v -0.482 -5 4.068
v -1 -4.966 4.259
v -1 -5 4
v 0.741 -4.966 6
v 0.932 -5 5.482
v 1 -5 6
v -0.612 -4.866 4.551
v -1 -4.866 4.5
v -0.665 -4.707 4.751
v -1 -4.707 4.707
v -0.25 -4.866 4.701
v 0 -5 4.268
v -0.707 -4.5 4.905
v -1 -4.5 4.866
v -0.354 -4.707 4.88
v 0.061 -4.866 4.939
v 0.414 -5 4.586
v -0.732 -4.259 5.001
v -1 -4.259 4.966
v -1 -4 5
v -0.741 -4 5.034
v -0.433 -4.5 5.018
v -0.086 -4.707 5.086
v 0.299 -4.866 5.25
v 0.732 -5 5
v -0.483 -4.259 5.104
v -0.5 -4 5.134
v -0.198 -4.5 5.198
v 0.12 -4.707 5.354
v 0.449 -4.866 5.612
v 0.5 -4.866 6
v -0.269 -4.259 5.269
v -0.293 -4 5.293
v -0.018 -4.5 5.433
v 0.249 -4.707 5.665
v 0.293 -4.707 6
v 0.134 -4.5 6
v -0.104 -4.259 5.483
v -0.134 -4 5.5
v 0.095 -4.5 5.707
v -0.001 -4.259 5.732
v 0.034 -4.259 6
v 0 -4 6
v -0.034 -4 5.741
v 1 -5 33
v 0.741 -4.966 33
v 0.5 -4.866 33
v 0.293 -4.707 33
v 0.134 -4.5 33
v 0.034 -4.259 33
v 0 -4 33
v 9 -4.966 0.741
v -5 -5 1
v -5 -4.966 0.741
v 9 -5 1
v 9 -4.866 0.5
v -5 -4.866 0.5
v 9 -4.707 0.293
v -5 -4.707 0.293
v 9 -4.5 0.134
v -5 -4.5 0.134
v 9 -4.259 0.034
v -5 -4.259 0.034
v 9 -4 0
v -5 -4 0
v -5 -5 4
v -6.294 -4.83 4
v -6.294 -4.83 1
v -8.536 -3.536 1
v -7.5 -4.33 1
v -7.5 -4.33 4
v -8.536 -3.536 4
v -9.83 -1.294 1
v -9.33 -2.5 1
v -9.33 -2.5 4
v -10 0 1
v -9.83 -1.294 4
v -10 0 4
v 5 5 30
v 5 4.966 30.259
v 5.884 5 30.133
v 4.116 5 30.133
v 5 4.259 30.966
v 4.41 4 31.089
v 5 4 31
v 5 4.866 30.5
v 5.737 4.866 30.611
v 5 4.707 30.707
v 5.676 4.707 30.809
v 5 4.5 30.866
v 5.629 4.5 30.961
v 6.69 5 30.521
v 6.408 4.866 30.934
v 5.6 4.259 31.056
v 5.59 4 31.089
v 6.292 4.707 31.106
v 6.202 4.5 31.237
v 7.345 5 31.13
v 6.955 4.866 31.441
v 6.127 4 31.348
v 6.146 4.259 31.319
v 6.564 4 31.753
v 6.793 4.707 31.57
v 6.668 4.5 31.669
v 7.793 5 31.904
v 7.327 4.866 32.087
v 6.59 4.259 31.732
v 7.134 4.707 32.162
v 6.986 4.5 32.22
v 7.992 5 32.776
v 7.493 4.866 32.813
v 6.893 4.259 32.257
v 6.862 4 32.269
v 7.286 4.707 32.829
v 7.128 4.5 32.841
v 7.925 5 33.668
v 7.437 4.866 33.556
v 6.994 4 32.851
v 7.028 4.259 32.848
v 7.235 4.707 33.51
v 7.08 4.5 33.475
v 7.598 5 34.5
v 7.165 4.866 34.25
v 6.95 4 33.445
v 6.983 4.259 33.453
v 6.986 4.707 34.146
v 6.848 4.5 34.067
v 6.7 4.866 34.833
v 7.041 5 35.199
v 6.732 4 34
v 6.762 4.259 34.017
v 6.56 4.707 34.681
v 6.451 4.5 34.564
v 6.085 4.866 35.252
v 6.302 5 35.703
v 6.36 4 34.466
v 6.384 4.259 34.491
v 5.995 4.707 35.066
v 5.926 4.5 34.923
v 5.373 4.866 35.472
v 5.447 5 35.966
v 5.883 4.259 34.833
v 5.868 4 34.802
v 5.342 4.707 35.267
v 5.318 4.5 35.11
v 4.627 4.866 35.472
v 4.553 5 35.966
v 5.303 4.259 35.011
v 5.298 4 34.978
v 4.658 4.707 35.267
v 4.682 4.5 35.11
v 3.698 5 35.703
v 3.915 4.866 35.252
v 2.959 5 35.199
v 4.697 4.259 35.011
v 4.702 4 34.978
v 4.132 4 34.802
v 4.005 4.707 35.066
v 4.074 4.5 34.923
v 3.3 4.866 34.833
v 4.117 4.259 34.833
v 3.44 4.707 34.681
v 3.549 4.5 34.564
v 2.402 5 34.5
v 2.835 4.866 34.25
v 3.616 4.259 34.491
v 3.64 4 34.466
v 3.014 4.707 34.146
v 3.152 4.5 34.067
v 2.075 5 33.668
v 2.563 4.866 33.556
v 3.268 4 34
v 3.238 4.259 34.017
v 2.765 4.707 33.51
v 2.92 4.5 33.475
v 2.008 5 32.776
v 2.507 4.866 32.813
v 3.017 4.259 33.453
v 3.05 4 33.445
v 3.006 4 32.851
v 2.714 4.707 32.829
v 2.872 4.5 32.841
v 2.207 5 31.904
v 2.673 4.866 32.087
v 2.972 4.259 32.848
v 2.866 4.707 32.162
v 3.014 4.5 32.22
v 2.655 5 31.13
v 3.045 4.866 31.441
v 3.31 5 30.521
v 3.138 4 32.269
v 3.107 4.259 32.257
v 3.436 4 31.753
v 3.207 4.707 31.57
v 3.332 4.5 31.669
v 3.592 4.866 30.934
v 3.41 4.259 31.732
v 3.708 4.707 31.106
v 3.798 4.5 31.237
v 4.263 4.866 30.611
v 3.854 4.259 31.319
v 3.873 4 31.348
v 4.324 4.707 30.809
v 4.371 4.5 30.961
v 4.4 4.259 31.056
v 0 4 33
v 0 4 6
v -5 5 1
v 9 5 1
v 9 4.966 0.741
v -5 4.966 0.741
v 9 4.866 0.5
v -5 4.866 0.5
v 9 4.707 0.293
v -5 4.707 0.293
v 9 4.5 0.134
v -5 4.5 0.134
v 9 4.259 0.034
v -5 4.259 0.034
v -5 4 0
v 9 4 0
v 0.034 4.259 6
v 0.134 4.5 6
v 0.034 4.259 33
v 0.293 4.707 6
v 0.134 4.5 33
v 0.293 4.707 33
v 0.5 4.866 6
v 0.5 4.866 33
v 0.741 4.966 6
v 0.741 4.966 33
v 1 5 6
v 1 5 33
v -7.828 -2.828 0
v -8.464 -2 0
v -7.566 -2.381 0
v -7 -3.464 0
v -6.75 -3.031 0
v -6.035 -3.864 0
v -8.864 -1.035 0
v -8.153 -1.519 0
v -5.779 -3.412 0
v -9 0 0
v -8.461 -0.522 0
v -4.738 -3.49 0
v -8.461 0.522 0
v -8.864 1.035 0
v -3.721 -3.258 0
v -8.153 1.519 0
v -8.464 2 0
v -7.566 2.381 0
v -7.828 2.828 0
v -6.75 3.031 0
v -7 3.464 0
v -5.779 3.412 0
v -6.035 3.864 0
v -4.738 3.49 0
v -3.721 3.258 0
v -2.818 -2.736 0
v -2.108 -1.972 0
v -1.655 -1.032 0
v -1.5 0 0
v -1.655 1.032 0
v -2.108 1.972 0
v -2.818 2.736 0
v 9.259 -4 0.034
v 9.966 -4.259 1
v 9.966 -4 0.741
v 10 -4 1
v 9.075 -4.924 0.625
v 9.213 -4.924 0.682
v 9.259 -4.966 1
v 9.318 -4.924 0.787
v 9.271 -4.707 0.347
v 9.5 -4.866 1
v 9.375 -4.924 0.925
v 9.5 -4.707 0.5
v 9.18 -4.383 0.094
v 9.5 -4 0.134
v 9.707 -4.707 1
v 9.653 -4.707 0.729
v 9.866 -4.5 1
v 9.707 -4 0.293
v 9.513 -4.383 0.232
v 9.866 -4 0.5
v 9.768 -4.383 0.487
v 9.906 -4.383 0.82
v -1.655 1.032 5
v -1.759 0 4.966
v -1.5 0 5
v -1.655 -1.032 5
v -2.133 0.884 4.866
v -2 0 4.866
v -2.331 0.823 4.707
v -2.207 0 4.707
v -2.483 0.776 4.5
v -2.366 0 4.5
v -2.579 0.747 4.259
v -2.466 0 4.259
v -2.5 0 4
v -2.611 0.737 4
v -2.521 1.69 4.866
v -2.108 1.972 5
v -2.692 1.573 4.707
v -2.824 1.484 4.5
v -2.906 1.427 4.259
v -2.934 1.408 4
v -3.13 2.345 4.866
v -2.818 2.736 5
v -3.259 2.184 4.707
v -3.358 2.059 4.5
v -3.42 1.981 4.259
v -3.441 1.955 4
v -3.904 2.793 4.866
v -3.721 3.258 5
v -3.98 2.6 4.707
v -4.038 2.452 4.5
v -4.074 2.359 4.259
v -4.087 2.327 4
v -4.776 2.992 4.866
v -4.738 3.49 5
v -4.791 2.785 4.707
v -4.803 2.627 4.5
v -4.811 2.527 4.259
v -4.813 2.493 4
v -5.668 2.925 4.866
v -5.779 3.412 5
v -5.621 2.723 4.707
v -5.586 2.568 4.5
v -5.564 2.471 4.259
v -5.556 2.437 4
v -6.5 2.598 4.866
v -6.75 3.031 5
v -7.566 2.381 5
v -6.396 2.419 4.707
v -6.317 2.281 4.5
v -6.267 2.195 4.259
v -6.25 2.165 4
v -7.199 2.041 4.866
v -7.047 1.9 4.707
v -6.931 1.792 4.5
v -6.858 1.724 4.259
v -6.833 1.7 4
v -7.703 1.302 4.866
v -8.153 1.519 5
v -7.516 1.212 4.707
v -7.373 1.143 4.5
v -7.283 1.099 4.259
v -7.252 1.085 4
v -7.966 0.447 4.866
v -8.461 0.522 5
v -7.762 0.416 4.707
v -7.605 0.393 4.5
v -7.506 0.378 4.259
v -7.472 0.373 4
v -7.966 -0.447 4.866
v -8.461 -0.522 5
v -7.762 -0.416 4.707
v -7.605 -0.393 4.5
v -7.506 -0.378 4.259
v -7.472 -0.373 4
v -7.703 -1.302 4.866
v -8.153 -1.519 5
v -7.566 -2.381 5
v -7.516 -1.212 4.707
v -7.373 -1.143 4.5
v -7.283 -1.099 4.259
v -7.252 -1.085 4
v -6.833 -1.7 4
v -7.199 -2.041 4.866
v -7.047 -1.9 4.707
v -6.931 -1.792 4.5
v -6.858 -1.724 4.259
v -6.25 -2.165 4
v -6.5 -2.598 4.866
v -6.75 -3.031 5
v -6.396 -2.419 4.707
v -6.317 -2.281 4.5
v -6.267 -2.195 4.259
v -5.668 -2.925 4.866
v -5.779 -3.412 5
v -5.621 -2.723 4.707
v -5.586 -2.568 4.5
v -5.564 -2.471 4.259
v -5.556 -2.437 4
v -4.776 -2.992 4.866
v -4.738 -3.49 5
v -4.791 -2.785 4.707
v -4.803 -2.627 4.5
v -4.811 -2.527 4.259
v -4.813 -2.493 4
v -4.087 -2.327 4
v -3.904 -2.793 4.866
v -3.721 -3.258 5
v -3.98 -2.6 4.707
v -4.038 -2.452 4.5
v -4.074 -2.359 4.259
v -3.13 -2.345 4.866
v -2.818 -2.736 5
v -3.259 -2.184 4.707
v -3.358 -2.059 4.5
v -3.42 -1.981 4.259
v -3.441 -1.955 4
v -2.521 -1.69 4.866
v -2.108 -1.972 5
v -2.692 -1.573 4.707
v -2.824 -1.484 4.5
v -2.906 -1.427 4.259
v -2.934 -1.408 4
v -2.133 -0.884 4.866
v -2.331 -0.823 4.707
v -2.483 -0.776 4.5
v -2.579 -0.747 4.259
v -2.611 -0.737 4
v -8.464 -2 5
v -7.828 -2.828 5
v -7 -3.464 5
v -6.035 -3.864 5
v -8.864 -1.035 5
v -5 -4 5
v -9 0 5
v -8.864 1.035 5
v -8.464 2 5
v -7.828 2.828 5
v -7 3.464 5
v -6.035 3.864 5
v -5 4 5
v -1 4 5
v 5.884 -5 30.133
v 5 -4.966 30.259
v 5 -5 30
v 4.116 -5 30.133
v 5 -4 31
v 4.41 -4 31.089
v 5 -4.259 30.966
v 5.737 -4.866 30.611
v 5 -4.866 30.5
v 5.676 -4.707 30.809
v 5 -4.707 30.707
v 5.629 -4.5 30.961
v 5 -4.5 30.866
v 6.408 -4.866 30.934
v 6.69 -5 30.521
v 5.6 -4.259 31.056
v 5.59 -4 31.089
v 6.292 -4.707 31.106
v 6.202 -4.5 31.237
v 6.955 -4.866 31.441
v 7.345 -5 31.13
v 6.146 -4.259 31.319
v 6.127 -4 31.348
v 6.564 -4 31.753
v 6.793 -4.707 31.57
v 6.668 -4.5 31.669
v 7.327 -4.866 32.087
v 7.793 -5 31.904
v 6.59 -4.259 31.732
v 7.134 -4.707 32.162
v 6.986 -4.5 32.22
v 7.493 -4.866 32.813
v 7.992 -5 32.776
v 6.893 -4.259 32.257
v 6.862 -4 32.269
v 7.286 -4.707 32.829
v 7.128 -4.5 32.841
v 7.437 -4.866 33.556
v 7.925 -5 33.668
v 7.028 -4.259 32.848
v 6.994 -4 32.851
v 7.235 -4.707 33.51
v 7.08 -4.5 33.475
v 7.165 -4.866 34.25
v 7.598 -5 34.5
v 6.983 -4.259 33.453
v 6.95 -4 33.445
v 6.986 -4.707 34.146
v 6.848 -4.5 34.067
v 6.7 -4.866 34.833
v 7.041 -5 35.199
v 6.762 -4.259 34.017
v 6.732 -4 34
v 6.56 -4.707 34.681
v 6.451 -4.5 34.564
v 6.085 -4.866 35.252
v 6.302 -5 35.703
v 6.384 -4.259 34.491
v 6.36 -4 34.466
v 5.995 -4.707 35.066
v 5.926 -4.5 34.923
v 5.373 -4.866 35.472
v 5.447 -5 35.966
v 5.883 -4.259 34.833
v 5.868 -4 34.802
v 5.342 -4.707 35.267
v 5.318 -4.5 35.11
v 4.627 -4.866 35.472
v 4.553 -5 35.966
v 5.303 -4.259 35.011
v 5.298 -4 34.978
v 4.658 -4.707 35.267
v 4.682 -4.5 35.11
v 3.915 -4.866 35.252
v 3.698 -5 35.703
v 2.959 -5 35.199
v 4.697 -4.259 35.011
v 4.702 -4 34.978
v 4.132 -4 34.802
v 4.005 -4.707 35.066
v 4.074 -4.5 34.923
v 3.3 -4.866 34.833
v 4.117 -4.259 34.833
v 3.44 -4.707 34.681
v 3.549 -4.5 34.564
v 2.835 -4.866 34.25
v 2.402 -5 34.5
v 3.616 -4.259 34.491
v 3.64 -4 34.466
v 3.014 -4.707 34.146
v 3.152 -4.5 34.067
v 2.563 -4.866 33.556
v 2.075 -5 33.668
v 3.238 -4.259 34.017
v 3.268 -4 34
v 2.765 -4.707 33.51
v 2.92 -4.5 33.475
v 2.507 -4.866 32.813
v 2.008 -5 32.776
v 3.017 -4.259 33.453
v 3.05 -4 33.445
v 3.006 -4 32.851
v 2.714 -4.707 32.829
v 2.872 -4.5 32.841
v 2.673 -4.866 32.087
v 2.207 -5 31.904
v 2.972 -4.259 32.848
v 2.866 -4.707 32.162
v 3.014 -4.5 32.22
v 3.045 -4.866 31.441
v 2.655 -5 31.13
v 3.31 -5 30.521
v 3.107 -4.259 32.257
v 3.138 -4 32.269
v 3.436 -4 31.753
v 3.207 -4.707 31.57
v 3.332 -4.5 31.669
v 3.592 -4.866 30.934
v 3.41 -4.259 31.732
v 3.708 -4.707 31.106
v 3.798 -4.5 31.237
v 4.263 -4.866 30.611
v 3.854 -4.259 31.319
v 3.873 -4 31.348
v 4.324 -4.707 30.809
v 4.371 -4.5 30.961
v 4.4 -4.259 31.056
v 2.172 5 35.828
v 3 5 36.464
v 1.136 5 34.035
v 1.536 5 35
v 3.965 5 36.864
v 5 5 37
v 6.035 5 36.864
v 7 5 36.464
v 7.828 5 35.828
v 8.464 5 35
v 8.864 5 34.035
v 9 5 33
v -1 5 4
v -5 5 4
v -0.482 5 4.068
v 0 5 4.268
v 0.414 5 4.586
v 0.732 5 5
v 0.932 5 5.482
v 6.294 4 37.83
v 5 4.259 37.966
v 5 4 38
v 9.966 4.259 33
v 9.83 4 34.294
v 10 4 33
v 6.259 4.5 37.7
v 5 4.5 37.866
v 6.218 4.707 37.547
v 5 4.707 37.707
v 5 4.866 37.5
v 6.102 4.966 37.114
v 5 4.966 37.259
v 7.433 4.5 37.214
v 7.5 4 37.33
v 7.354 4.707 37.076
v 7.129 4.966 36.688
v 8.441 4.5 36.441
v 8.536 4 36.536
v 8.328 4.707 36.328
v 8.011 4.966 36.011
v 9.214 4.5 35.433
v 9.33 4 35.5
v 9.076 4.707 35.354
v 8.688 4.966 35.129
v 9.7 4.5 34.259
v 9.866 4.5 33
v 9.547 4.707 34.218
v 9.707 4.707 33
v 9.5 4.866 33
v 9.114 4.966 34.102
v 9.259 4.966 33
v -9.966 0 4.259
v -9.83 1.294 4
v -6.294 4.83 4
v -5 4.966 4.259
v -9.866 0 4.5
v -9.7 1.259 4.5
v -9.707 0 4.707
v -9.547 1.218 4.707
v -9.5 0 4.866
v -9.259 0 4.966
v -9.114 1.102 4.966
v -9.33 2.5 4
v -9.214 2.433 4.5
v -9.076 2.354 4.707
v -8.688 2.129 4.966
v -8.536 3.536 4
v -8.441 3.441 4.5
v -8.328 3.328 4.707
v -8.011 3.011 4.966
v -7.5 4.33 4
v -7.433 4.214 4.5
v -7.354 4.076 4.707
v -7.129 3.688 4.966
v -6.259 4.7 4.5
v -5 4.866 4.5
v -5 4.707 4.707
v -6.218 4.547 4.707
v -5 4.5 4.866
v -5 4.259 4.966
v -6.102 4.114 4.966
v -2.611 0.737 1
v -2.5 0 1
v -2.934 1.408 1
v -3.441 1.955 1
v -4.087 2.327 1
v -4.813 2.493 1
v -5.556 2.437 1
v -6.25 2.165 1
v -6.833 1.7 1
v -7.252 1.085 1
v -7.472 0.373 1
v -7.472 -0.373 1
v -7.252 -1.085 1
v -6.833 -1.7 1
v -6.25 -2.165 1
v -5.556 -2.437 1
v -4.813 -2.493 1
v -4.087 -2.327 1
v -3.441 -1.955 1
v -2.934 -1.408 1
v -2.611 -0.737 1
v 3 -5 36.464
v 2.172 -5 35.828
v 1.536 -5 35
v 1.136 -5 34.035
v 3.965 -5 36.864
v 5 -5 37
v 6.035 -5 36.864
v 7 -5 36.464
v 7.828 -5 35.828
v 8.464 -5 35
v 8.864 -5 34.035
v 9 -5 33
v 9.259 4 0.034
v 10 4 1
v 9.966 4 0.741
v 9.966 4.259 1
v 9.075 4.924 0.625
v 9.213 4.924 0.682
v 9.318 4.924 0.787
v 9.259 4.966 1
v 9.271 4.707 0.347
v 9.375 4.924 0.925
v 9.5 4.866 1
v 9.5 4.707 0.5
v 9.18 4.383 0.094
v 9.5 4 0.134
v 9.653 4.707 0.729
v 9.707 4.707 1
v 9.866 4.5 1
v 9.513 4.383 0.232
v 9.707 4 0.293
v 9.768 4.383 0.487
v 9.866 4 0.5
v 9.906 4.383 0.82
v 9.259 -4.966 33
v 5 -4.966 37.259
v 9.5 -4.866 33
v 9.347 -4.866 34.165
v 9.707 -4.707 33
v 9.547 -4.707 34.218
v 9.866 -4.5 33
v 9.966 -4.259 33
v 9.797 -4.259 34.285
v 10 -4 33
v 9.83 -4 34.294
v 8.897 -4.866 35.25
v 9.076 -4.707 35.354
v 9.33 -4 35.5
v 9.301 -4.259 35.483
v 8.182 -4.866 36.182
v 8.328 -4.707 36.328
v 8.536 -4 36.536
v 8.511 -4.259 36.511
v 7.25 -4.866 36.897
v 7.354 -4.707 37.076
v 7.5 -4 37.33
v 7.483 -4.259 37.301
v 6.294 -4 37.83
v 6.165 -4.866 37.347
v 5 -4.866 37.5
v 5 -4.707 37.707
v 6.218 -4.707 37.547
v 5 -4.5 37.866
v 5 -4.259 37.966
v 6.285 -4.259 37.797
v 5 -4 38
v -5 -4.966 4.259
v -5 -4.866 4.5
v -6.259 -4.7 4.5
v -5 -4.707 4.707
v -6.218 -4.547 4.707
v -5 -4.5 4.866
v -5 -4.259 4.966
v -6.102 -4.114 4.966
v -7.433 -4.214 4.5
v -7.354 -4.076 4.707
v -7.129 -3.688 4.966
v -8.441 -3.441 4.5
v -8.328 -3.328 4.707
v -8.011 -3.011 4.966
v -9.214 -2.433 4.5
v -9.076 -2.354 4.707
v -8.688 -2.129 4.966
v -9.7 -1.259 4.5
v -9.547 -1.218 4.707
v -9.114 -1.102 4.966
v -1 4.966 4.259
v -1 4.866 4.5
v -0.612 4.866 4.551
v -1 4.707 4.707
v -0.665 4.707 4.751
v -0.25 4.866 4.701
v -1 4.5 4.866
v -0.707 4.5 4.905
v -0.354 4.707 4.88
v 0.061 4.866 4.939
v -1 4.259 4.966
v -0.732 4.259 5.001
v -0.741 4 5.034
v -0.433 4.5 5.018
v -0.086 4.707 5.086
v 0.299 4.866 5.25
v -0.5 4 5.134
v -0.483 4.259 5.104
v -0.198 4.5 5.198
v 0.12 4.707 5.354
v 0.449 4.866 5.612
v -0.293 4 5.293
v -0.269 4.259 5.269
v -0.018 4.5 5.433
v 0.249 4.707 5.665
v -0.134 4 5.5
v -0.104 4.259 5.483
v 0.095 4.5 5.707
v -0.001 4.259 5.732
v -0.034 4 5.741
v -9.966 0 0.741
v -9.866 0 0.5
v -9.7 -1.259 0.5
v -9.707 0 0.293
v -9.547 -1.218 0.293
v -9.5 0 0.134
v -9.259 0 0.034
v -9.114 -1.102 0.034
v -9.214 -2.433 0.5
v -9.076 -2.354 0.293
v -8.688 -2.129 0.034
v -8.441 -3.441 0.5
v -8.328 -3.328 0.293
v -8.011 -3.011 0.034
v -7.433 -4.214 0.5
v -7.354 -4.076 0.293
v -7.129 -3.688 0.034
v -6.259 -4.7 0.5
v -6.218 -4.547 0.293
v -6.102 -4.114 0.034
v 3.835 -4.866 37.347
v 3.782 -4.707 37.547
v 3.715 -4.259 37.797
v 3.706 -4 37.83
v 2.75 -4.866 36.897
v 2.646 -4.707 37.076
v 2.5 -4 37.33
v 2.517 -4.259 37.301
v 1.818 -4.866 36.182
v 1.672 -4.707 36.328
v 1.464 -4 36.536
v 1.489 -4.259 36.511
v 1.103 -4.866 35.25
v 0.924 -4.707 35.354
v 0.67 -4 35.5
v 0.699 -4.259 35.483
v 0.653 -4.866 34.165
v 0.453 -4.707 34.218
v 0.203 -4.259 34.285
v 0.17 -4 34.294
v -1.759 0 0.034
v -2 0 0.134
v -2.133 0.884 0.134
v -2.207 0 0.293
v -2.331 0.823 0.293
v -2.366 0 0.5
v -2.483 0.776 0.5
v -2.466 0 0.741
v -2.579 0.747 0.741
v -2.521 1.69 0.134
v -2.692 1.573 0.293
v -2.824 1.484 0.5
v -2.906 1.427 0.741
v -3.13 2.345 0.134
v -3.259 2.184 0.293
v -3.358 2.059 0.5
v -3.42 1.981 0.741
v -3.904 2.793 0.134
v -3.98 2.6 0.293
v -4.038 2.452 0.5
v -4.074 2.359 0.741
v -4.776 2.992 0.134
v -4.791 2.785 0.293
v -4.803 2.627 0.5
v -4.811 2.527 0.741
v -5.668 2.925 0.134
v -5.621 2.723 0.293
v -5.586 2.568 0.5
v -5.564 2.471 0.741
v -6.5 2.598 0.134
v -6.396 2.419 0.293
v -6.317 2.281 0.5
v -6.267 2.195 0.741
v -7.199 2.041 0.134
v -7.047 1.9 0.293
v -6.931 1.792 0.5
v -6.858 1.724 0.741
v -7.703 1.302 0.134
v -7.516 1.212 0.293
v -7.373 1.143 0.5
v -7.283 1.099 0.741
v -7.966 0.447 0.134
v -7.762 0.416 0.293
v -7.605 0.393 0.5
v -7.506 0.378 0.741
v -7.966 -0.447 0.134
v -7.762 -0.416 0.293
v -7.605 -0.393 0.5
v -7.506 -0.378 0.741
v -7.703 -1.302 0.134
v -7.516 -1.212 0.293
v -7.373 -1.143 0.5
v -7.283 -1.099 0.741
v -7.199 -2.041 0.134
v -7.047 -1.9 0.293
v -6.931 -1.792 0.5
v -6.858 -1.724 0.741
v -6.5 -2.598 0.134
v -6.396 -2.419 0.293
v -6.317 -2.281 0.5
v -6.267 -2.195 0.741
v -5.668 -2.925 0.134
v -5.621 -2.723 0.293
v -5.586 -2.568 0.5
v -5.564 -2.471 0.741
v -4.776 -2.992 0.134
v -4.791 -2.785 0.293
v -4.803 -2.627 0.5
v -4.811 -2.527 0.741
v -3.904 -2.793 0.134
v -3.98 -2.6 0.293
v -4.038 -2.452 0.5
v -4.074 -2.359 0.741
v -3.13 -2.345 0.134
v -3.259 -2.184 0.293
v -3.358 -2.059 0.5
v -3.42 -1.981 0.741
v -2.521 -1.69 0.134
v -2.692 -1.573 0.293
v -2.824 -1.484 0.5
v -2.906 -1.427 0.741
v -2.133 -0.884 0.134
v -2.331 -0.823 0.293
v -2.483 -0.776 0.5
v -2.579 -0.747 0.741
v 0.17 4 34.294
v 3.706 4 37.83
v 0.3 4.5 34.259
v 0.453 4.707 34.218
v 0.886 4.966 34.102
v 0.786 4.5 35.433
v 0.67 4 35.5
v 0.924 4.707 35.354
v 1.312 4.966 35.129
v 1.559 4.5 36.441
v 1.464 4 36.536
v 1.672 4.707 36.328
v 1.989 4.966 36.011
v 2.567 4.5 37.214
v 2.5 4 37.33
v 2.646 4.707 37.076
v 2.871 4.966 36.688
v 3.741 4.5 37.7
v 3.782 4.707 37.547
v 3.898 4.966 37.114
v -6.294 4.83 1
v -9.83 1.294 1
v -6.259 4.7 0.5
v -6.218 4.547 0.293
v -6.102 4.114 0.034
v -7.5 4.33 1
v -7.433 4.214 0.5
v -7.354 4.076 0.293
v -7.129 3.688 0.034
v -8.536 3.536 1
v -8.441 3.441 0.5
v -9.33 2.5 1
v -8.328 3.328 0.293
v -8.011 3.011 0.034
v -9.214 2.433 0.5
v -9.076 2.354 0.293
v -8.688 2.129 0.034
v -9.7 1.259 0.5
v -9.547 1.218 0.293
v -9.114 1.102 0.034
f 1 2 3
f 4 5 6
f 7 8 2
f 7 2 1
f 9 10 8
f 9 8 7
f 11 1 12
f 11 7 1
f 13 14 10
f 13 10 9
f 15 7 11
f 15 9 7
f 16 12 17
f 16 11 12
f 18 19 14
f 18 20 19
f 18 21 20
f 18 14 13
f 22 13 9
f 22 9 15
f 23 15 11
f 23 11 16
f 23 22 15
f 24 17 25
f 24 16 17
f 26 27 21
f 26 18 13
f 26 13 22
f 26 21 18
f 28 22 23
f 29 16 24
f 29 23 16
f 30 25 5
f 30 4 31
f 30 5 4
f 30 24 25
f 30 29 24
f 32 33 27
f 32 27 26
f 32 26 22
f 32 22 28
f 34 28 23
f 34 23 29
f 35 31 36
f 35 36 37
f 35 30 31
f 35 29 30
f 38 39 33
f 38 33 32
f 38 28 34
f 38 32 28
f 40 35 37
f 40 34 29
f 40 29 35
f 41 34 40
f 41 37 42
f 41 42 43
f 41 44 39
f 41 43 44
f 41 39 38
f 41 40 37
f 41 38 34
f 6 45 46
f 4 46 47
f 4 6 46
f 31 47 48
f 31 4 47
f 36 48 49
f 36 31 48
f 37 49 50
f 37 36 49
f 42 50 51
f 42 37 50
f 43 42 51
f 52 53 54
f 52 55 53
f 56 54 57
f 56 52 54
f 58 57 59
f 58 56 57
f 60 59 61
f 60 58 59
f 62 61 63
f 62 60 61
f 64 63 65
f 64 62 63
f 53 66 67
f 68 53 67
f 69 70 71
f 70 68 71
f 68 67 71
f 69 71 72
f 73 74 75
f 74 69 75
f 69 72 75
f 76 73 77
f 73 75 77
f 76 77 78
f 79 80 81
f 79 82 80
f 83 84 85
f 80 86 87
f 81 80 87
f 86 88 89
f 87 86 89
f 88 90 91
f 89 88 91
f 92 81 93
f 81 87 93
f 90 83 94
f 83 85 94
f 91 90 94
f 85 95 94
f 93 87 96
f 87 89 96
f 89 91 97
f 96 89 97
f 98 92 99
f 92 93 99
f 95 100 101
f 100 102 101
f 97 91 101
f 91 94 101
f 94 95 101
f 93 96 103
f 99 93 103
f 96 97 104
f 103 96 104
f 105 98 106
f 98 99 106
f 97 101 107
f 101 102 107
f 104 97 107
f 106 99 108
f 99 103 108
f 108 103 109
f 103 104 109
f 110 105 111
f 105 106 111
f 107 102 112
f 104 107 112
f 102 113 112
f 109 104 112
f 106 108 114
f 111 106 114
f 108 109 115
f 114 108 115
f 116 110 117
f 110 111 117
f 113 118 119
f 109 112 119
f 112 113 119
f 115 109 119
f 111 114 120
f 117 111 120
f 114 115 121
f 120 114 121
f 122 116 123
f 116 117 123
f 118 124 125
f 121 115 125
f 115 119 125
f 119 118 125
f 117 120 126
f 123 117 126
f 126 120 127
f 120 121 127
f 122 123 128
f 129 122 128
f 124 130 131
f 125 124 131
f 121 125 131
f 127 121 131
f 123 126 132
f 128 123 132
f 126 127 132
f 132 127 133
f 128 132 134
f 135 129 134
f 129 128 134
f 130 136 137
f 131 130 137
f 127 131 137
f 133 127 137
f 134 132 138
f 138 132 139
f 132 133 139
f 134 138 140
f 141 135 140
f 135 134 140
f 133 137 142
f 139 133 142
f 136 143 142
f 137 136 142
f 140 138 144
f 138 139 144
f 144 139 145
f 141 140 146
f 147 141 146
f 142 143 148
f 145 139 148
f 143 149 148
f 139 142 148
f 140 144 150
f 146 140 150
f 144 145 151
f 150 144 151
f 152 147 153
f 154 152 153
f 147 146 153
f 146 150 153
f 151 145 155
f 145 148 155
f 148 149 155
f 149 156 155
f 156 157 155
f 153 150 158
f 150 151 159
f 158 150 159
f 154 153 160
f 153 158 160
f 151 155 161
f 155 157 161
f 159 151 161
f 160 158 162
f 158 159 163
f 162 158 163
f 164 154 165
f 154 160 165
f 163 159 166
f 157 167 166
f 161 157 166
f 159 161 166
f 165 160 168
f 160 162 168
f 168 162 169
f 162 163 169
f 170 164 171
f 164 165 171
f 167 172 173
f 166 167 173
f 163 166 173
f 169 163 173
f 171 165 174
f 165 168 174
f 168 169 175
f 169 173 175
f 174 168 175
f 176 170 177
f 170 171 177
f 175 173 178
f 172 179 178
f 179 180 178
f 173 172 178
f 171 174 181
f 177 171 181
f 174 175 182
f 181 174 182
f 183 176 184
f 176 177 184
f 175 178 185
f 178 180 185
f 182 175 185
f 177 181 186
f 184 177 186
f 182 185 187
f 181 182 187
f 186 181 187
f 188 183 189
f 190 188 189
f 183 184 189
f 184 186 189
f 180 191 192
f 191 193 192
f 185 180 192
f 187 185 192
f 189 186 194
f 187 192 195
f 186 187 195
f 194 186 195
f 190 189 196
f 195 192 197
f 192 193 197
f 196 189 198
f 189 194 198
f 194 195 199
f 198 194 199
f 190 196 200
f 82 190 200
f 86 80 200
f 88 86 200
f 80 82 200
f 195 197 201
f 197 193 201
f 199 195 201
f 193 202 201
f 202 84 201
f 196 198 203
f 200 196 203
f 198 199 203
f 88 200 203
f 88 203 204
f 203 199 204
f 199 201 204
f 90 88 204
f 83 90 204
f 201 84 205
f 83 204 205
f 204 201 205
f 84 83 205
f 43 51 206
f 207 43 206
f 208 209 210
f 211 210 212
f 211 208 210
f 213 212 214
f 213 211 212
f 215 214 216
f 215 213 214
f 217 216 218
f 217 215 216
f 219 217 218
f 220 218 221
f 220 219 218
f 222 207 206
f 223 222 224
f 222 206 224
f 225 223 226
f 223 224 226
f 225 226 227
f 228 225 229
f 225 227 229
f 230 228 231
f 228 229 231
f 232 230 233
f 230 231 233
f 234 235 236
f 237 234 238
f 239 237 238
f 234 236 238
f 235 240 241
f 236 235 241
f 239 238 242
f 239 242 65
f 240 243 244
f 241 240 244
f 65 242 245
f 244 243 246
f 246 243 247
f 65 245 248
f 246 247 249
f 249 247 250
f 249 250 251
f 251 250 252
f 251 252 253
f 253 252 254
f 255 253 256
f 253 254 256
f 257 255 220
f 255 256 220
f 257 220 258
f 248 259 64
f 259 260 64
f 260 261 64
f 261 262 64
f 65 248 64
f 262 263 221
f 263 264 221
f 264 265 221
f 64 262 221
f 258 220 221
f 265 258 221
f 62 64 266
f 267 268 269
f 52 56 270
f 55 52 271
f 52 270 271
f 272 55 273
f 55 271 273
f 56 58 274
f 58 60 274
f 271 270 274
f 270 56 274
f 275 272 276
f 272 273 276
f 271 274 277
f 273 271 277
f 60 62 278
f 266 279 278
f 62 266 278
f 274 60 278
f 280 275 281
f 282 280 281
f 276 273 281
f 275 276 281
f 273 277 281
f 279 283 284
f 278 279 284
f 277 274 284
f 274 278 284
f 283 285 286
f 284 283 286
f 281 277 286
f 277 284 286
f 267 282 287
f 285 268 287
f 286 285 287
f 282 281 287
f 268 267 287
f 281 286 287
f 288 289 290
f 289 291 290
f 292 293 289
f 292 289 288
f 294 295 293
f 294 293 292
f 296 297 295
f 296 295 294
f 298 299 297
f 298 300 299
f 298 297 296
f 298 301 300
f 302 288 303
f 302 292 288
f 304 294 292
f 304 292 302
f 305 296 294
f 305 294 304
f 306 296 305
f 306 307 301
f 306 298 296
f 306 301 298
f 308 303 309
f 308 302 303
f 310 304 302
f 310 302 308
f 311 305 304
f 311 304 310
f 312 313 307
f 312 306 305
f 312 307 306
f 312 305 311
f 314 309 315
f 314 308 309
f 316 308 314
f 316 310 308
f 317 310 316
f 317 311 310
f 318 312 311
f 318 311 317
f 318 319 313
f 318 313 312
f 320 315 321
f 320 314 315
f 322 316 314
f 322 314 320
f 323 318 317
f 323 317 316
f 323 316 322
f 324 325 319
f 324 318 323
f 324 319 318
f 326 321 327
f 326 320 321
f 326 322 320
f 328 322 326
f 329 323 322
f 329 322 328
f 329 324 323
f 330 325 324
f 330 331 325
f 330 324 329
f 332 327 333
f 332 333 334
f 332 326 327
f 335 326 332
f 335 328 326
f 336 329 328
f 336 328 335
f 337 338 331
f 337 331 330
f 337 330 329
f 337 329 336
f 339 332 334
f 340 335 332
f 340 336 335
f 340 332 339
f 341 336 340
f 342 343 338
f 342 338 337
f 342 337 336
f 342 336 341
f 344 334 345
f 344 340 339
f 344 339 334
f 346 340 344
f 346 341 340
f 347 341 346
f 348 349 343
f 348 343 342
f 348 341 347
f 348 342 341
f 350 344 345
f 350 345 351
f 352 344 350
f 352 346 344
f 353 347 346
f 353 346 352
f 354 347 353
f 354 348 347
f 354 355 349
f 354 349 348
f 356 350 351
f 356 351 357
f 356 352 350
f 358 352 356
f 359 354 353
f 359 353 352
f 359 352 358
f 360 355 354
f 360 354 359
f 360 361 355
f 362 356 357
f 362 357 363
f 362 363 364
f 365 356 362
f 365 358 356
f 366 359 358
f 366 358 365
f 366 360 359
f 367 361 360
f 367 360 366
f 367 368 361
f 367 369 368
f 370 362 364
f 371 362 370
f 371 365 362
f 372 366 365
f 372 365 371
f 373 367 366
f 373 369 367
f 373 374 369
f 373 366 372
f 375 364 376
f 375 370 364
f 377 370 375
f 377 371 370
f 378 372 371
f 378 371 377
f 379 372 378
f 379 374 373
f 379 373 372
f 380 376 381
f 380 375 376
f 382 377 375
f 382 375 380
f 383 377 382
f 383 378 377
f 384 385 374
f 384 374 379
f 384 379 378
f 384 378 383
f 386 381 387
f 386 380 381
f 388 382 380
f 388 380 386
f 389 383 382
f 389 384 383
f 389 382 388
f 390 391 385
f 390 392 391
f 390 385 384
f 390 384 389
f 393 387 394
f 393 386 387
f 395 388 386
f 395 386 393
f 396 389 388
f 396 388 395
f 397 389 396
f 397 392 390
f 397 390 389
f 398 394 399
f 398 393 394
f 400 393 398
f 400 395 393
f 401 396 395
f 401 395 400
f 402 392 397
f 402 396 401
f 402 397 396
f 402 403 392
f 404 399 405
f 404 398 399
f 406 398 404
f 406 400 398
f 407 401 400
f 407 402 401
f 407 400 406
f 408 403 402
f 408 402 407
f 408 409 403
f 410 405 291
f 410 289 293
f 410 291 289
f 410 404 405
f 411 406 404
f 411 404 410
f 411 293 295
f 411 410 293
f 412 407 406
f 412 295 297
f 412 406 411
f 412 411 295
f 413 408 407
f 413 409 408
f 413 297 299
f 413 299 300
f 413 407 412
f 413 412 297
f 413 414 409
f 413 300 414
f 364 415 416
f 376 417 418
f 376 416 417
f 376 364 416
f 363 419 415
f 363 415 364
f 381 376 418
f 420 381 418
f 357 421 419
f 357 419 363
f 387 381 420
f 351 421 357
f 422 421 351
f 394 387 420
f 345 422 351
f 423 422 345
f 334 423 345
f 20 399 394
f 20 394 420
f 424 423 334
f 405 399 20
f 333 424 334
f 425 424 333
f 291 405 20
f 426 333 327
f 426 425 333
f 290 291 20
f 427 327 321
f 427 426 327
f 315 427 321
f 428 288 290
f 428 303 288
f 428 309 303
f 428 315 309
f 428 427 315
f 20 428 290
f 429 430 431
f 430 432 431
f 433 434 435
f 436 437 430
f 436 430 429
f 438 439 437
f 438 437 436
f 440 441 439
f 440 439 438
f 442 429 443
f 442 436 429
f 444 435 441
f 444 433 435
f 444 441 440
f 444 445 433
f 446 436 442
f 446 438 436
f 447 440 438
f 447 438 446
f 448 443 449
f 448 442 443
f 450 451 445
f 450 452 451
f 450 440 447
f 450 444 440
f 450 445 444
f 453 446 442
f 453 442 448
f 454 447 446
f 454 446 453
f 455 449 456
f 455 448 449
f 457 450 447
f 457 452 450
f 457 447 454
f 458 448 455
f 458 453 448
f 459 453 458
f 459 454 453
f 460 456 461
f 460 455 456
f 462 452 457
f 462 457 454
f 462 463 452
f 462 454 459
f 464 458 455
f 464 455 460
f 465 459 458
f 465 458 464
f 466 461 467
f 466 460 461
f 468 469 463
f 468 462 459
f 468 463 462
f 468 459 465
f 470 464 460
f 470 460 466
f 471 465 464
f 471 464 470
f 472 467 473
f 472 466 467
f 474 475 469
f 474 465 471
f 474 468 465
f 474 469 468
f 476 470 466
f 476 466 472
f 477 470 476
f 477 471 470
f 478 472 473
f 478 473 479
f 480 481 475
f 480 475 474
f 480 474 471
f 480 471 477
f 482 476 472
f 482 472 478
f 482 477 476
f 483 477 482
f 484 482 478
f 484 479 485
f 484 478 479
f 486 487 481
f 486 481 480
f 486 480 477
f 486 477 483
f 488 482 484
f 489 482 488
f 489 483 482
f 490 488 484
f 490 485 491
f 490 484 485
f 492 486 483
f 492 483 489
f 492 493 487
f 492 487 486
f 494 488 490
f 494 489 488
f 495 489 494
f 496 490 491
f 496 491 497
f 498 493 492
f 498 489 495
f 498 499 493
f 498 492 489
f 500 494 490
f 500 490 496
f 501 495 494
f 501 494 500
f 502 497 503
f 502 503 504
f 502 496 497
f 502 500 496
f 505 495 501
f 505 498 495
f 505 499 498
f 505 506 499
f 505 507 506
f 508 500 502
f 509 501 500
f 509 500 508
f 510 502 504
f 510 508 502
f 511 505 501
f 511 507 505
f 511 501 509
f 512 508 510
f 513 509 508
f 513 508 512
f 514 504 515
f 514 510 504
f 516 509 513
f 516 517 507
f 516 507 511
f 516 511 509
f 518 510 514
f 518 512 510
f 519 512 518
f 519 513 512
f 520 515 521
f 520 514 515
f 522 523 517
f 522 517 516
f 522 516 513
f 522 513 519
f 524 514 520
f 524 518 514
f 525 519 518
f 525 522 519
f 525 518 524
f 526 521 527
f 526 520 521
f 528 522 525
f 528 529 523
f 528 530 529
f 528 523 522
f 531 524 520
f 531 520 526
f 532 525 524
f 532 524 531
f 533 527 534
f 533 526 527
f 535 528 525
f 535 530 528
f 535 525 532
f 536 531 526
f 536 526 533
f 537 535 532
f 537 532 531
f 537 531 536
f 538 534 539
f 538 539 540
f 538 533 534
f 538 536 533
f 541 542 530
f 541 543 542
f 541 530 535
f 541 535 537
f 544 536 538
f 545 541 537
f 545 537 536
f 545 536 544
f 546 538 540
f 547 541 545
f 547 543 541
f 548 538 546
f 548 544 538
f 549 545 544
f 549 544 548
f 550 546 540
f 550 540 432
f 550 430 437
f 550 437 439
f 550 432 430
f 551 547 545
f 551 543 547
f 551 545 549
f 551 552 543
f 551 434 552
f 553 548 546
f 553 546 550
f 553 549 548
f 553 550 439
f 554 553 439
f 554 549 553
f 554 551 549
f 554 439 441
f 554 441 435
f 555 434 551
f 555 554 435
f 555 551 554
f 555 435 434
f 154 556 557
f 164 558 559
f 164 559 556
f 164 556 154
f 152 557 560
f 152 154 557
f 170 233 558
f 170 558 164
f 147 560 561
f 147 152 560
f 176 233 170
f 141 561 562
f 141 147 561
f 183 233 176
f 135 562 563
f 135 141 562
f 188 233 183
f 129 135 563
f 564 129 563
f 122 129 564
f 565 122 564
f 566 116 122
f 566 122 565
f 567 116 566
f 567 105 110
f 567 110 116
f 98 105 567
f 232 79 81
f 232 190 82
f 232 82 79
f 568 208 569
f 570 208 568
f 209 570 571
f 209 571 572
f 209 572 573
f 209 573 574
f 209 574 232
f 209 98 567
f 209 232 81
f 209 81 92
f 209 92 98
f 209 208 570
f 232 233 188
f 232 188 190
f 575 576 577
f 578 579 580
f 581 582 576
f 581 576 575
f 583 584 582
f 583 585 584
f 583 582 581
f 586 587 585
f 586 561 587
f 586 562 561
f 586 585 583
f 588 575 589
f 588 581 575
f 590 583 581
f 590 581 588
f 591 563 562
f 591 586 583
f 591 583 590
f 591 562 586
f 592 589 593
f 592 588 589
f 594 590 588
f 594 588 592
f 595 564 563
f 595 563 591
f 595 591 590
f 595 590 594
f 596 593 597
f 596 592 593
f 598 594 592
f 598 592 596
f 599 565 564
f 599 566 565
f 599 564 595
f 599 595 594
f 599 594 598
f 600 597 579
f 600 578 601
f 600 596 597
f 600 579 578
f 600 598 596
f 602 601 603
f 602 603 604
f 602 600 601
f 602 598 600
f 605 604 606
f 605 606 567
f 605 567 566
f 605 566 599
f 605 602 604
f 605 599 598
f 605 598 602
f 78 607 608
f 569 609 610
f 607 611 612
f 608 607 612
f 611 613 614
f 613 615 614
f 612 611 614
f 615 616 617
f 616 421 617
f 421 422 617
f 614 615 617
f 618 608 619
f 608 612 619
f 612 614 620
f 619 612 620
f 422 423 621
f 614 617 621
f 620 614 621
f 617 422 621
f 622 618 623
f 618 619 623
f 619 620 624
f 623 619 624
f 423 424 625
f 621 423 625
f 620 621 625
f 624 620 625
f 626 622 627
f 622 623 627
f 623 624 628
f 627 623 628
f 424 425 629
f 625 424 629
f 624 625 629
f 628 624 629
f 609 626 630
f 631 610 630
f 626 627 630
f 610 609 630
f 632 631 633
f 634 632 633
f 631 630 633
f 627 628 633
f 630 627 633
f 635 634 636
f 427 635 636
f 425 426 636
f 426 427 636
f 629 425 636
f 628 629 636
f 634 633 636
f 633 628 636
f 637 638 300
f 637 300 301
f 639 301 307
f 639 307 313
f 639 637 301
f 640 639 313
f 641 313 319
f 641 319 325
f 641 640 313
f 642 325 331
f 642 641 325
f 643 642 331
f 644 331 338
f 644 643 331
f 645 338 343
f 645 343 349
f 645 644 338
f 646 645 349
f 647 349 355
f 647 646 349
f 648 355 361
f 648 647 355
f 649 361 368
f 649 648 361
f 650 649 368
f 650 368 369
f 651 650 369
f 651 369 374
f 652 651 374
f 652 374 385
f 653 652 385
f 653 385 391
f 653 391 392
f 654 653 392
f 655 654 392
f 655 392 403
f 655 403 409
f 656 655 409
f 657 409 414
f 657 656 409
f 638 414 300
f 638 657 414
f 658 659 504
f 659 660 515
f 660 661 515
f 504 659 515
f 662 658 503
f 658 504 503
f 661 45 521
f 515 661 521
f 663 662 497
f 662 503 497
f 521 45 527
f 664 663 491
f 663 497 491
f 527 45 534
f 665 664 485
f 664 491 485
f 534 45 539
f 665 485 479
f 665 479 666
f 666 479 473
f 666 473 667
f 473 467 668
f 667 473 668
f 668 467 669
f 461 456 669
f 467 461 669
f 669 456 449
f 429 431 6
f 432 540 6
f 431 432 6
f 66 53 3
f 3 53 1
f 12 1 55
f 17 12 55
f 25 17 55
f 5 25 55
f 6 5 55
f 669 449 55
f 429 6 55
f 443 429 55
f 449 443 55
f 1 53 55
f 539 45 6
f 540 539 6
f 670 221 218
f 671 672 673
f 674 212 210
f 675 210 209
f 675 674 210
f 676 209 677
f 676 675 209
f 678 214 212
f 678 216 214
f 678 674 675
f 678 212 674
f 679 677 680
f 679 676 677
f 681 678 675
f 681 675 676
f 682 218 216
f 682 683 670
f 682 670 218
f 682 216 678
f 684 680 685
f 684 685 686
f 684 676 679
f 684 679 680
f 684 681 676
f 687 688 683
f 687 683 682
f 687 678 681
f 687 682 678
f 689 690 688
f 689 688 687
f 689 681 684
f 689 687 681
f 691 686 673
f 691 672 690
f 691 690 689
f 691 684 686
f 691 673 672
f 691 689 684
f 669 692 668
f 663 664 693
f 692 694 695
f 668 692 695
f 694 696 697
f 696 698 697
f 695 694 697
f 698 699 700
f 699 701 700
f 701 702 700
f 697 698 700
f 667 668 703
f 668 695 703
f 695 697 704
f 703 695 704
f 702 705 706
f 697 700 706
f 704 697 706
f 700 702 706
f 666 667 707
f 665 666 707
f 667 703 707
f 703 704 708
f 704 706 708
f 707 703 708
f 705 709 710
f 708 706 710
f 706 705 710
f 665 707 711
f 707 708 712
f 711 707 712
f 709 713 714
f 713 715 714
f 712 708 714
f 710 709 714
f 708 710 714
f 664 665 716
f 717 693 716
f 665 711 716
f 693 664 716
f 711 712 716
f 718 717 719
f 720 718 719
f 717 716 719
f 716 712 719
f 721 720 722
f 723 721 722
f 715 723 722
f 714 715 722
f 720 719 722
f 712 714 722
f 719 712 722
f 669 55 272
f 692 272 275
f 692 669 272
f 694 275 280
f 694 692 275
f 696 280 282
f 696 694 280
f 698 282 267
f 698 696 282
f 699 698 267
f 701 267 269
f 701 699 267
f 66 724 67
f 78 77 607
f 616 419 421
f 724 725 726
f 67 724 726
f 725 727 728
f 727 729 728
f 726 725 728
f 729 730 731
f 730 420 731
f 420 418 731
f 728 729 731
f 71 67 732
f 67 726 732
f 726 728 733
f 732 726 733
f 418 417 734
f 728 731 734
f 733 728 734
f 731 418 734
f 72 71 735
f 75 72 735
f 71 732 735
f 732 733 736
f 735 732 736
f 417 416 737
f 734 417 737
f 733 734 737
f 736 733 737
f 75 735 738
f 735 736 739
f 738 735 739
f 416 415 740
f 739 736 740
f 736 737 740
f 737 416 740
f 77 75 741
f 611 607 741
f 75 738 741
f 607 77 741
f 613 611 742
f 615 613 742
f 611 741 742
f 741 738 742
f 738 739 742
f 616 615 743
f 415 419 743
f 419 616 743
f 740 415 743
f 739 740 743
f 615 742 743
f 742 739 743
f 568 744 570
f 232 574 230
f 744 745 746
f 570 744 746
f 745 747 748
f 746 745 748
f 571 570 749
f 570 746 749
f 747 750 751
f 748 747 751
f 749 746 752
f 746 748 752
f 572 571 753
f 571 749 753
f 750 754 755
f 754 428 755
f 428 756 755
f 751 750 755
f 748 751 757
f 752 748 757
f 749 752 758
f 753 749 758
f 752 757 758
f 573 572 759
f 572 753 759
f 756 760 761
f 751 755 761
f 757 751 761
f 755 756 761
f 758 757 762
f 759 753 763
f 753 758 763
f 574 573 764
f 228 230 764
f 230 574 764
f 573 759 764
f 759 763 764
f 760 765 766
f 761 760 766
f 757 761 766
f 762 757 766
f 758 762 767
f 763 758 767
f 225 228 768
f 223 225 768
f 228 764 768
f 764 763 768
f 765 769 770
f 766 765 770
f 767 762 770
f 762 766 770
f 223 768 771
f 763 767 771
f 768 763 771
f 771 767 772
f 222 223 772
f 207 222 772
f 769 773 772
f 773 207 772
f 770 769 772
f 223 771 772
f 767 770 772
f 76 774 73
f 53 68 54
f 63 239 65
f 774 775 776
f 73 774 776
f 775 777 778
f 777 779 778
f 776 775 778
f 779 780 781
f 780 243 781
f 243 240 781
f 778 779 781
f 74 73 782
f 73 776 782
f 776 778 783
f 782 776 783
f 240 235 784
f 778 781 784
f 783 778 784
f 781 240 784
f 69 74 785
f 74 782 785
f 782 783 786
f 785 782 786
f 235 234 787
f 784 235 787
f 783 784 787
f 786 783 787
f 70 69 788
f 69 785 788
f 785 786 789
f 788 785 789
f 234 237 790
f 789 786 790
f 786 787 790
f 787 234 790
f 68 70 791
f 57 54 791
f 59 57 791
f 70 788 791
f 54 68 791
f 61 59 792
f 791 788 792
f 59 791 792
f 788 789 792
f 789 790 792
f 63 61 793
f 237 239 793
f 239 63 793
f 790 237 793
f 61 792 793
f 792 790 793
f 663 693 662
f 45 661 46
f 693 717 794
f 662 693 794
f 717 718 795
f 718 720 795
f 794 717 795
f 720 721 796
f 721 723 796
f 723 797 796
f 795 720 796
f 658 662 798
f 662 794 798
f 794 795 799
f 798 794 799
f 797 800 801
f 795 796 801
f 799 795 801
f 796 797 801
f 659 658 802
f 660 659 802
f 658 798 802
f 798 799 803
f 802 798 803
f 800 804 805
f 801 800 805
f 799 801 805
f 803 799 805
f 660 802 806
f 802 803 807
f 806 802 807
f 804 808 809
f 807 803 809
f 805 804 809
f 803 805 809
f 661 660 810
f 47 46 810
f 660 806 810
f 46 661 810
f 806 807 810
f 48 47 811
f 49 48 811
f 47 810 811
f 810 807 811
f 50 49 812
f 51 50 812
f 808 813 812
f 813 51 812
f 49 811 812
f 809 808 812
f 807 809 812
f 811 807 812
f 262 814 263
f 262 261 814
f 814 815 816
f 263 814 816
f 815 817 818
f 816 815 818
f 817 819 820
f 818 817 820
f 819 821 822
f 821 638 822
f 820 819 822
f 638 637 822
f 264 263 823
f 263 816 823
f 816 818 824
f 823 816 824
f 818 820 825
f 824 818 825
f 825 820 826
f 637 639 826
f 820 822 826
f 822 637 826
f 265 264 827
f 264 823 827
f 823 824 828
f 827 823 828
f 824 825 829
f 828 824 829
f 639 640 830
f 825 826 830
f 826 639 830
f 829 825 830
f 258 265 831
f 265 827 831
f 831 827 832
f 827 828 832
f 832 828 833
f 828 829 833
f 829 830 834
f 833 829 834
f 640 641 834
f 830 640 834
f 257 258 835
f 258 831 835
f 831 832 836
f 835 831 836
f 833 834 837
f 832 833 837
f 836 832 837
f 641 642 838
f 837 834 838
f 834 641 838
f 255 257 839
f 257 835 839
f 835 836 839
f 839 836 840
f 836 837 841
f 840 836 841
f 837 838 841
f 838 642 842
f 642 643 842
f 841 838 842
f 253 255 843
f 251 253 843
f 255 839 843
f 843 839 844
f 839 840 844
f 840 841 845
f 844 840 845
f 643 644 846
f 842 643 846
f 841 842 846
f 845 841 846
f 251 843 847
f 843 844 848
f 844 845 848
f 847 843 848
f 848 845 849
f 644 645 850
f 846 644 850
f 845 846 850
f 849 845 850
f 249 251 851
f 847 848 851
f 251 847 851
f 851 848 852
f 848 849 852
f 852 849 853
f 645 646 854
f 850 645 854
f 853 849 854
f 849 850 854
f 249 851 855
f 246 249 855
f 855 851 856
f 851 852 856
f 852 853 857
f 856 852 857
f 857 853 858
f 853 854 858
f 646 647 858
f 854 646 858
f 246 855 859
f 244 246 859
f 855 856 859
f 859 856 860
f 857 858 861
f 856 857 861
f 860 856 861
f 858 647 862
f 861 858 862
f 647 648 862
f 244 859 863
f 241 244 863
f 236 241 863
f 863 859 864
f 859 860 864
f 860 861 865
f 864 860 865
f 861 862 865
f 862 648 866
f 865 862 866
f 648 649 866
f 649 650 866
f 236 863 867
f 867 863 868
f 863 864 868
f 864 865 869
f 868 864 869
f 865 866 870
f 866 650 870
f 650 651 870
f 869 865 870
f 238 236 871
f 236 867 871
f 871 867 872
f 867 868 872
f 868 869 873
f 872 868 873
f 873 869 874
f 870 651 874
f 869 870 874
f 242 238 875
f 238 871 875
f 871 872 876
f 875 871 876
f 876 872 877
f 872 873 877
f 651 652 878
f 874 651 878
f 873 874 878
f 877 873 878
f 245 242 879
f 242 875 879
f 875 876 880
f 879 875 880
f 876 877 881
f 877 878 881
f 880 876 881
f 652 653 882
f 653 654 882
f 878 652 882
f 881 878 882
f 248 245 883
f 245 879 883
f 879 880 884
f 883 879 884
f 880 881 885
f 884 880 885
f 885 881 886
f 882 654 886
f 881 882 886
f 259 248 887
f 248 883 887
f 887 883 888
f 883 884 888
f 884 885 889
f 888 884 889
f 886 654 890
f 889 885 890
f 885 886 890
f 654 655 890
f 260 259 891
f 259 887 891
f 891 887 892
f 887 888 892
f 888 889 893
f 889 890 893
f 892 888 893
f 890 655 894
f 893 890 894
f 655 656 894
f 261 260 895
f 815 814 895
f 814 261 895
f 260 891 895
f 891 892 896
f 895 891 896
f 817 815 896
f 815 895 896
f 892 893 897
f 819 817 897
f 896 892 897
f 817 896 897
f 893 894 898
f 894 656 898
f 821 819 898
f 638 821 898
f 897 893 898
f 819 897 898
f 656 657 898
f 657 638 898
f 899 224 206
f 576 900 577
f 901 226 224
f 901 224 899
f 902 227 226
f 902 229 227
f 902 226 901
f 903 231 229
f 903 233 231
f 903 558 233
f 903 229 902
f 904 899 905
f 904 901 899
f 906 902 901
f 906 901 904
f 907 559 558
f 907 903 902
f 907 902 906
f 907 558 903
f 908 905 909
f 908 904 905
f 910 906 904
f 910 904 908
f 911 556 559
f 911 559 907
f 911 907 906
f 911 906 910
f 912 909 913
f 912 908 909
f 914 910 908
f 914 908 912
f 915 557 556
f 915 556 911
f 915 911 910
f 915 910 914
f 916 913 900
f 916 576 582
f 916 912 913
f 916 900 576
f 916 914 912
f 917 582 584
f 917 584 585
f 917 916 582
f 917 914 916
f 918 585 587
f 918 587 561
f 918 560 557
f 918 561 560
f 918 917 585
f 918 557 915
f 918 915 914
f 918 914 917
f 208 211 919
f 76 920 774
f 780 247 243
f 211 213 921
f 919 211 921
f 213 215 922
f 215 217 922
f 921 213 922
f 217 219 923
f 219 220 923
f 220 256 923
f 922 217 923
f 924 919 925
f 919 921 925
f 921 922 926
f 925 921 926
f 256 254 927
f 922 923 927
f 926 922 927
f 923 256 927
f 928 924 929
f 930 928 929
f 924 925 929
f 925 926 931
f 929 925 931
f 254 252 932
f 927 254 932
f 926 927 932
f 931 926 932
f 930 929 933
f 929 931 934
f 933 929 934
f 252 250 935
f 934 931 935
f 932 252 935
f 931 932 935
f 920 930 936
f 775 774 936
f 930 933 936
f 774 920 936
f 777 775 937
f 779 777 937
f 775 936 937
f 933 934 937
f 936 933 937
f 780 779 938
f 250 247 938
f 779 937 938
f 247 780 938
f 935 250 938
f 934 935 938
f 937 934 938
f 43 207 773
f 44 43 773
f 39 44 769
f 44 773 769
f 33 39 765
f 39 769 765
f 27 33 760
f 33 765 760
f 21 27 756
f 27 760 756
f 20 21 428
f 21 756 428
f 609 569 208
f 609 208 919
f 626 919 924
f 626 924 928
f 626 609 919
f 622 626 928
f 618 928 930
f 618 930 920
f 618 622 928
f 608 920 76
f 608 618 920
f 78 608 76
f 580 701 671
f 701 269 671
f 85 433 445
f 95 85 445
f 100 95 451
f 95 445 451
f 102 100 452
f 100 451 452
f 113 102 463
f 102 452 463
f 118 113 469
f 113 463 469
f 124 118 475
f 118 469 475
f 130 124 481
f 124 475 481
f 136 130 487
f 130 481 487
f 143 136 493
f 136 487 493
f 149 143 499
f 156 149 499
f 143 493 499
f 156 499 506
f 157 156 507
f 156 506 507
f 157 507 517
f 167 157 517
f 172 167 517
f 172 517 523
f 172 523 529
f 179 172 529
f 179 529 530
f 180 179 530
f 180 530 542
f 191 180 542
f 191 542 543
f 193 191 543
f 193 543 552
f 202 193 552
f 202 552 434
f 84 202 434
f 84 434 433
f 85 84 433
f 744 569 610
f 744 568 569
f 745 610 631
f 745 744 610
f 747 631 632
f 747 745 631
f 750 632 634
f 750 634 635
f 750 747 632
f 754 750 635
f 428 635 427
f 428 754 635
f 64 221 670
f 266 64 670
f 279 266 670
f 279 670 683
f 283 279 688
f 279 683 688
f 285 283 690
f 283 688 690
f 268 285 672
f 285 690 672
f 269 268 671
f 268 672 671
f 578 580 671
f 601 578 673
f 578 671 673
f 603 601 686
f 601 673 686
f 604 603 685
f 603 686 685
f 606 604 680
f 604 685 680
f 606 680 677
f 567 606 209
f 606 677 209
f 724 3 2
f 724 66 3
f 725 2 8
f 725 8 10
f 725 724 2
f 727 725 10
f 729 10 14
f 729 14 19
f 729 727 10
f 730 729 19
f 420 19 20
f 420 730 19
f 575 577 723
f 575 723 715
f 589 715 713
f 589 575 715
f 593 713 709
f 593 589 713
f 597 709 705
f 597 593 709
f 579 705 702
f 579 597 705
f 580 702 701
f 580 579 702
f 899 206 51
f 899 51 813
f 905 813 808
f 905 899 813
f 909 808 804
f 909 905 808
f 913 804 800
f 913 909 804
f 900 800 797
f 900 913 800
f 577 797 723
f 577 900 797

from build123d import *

# Parameters (mm, degrees)
SKETCH1_W           = 10
SKETCH1_H           = 10
SKETCH1_R           = 2.5
BOSS_EXTRUDE1_DEPTH = 5
SKETCH1_4_W         = 10
SKETCH1_4_H         = 10
BOSS_EXTRUDE2_DEPTH = 38
CUT_EXTRUDE1_REACH  = 42.546
SKETCH2_R           = 2
FILLET1_R           = 5
FILLET2_R           = 1


with BuildPart() as part:
    # Sketch1 → Boss-Extrude1 (new body)
    with BuildSketch(Plane.XY):
        with Locations((-5, 0)):
            Rectangle(SKETCH1_W, SKETCH1_H)
        with Locations((-5, 0)):
            Circle(SKETCH1_R, mode=Mode.SUBTRACT)
    extrude(amount=BOSS_EXTRUDE1_DEPTH)

    # Sketch1<4> → Boss-Extrude2 (add)
    with BuildSketch(Plane.XY):
        with Locations((5, 0)):
            Rectangle(SKETCH1_4_W, SKETCH1_4_H)
    extrude(amount=BOSS_EXTRUDE2_DEPTH)

    # Sketch2 → Cut-Extrude1 (cut, up to next)
    with BuildSketch(Plane.XZ.offset(5), mode=Mode.PRIVATE) as cut_extrude1_sk1:
        with Locations(Location((5, 33, 0), (0, 0, 270))):
            Circle(SKETCH2_R)
    cut_extrude1_tool1 = extrude(cut_extrude1_sk1.sketch, amount=-CUT_EXTRUDE1_REACH, mode=Mode.PRIVATE) & part.part
    add(cut_extrude1_tool1.solids().sort_by_distance((5, -5, 33))[0], mode=Mode.SUBTRACT)

    # Fillet1
    fillet1_edges = [part.edges().sort_by_distance(p)[0] for p in [
        (-10, 5, 2.5),
        (-10, -5, 2.5),
        (10, 0, 38),
        (0, 0, 38),
    ]]
    fillet(fillet1_edges, radius=FILLET1_R - 0.0001)  # a hair under: the kernel refuses the full size

    # Fillet2
    fillet2_edges = [part.edges().sort_by_distance(p)[0] for p in [
        (10, 0, 0),
        (0, 0, 5),
        (5, 5, 35),
        (5, -5, 35),
        (2.49995, 5, 0),
        (2.49995, -5, 0),
        (-8.535563195, -3.535563195, 0),
        (-8.535563195, 3.535563195, 0),
        (-2.50005, 5, 5),
        (0, 5, 19.00005),
        (10, 5, 16.50005),
        (1.464436805, 5, 36.535563195),
        (8.535563195, 5, 36.535563195),
        (-2.50005, -5, 5),
        (-8.535563195, -3.535563195, 5),
        (-8.535563195, 3.535563195, 5),
        (10, -5, 16.50005),
        (0, -5, 19.00005),
        (1.464436805, -5, 36.535563195),
        (8.535563195, -5, 36.535563195),
        (-7.5, 0, 5),
        (-7.5, 0, 0),
    ]]
    fillet(fillet2_edges, radius=FILLET2_R)


solid = part.part
